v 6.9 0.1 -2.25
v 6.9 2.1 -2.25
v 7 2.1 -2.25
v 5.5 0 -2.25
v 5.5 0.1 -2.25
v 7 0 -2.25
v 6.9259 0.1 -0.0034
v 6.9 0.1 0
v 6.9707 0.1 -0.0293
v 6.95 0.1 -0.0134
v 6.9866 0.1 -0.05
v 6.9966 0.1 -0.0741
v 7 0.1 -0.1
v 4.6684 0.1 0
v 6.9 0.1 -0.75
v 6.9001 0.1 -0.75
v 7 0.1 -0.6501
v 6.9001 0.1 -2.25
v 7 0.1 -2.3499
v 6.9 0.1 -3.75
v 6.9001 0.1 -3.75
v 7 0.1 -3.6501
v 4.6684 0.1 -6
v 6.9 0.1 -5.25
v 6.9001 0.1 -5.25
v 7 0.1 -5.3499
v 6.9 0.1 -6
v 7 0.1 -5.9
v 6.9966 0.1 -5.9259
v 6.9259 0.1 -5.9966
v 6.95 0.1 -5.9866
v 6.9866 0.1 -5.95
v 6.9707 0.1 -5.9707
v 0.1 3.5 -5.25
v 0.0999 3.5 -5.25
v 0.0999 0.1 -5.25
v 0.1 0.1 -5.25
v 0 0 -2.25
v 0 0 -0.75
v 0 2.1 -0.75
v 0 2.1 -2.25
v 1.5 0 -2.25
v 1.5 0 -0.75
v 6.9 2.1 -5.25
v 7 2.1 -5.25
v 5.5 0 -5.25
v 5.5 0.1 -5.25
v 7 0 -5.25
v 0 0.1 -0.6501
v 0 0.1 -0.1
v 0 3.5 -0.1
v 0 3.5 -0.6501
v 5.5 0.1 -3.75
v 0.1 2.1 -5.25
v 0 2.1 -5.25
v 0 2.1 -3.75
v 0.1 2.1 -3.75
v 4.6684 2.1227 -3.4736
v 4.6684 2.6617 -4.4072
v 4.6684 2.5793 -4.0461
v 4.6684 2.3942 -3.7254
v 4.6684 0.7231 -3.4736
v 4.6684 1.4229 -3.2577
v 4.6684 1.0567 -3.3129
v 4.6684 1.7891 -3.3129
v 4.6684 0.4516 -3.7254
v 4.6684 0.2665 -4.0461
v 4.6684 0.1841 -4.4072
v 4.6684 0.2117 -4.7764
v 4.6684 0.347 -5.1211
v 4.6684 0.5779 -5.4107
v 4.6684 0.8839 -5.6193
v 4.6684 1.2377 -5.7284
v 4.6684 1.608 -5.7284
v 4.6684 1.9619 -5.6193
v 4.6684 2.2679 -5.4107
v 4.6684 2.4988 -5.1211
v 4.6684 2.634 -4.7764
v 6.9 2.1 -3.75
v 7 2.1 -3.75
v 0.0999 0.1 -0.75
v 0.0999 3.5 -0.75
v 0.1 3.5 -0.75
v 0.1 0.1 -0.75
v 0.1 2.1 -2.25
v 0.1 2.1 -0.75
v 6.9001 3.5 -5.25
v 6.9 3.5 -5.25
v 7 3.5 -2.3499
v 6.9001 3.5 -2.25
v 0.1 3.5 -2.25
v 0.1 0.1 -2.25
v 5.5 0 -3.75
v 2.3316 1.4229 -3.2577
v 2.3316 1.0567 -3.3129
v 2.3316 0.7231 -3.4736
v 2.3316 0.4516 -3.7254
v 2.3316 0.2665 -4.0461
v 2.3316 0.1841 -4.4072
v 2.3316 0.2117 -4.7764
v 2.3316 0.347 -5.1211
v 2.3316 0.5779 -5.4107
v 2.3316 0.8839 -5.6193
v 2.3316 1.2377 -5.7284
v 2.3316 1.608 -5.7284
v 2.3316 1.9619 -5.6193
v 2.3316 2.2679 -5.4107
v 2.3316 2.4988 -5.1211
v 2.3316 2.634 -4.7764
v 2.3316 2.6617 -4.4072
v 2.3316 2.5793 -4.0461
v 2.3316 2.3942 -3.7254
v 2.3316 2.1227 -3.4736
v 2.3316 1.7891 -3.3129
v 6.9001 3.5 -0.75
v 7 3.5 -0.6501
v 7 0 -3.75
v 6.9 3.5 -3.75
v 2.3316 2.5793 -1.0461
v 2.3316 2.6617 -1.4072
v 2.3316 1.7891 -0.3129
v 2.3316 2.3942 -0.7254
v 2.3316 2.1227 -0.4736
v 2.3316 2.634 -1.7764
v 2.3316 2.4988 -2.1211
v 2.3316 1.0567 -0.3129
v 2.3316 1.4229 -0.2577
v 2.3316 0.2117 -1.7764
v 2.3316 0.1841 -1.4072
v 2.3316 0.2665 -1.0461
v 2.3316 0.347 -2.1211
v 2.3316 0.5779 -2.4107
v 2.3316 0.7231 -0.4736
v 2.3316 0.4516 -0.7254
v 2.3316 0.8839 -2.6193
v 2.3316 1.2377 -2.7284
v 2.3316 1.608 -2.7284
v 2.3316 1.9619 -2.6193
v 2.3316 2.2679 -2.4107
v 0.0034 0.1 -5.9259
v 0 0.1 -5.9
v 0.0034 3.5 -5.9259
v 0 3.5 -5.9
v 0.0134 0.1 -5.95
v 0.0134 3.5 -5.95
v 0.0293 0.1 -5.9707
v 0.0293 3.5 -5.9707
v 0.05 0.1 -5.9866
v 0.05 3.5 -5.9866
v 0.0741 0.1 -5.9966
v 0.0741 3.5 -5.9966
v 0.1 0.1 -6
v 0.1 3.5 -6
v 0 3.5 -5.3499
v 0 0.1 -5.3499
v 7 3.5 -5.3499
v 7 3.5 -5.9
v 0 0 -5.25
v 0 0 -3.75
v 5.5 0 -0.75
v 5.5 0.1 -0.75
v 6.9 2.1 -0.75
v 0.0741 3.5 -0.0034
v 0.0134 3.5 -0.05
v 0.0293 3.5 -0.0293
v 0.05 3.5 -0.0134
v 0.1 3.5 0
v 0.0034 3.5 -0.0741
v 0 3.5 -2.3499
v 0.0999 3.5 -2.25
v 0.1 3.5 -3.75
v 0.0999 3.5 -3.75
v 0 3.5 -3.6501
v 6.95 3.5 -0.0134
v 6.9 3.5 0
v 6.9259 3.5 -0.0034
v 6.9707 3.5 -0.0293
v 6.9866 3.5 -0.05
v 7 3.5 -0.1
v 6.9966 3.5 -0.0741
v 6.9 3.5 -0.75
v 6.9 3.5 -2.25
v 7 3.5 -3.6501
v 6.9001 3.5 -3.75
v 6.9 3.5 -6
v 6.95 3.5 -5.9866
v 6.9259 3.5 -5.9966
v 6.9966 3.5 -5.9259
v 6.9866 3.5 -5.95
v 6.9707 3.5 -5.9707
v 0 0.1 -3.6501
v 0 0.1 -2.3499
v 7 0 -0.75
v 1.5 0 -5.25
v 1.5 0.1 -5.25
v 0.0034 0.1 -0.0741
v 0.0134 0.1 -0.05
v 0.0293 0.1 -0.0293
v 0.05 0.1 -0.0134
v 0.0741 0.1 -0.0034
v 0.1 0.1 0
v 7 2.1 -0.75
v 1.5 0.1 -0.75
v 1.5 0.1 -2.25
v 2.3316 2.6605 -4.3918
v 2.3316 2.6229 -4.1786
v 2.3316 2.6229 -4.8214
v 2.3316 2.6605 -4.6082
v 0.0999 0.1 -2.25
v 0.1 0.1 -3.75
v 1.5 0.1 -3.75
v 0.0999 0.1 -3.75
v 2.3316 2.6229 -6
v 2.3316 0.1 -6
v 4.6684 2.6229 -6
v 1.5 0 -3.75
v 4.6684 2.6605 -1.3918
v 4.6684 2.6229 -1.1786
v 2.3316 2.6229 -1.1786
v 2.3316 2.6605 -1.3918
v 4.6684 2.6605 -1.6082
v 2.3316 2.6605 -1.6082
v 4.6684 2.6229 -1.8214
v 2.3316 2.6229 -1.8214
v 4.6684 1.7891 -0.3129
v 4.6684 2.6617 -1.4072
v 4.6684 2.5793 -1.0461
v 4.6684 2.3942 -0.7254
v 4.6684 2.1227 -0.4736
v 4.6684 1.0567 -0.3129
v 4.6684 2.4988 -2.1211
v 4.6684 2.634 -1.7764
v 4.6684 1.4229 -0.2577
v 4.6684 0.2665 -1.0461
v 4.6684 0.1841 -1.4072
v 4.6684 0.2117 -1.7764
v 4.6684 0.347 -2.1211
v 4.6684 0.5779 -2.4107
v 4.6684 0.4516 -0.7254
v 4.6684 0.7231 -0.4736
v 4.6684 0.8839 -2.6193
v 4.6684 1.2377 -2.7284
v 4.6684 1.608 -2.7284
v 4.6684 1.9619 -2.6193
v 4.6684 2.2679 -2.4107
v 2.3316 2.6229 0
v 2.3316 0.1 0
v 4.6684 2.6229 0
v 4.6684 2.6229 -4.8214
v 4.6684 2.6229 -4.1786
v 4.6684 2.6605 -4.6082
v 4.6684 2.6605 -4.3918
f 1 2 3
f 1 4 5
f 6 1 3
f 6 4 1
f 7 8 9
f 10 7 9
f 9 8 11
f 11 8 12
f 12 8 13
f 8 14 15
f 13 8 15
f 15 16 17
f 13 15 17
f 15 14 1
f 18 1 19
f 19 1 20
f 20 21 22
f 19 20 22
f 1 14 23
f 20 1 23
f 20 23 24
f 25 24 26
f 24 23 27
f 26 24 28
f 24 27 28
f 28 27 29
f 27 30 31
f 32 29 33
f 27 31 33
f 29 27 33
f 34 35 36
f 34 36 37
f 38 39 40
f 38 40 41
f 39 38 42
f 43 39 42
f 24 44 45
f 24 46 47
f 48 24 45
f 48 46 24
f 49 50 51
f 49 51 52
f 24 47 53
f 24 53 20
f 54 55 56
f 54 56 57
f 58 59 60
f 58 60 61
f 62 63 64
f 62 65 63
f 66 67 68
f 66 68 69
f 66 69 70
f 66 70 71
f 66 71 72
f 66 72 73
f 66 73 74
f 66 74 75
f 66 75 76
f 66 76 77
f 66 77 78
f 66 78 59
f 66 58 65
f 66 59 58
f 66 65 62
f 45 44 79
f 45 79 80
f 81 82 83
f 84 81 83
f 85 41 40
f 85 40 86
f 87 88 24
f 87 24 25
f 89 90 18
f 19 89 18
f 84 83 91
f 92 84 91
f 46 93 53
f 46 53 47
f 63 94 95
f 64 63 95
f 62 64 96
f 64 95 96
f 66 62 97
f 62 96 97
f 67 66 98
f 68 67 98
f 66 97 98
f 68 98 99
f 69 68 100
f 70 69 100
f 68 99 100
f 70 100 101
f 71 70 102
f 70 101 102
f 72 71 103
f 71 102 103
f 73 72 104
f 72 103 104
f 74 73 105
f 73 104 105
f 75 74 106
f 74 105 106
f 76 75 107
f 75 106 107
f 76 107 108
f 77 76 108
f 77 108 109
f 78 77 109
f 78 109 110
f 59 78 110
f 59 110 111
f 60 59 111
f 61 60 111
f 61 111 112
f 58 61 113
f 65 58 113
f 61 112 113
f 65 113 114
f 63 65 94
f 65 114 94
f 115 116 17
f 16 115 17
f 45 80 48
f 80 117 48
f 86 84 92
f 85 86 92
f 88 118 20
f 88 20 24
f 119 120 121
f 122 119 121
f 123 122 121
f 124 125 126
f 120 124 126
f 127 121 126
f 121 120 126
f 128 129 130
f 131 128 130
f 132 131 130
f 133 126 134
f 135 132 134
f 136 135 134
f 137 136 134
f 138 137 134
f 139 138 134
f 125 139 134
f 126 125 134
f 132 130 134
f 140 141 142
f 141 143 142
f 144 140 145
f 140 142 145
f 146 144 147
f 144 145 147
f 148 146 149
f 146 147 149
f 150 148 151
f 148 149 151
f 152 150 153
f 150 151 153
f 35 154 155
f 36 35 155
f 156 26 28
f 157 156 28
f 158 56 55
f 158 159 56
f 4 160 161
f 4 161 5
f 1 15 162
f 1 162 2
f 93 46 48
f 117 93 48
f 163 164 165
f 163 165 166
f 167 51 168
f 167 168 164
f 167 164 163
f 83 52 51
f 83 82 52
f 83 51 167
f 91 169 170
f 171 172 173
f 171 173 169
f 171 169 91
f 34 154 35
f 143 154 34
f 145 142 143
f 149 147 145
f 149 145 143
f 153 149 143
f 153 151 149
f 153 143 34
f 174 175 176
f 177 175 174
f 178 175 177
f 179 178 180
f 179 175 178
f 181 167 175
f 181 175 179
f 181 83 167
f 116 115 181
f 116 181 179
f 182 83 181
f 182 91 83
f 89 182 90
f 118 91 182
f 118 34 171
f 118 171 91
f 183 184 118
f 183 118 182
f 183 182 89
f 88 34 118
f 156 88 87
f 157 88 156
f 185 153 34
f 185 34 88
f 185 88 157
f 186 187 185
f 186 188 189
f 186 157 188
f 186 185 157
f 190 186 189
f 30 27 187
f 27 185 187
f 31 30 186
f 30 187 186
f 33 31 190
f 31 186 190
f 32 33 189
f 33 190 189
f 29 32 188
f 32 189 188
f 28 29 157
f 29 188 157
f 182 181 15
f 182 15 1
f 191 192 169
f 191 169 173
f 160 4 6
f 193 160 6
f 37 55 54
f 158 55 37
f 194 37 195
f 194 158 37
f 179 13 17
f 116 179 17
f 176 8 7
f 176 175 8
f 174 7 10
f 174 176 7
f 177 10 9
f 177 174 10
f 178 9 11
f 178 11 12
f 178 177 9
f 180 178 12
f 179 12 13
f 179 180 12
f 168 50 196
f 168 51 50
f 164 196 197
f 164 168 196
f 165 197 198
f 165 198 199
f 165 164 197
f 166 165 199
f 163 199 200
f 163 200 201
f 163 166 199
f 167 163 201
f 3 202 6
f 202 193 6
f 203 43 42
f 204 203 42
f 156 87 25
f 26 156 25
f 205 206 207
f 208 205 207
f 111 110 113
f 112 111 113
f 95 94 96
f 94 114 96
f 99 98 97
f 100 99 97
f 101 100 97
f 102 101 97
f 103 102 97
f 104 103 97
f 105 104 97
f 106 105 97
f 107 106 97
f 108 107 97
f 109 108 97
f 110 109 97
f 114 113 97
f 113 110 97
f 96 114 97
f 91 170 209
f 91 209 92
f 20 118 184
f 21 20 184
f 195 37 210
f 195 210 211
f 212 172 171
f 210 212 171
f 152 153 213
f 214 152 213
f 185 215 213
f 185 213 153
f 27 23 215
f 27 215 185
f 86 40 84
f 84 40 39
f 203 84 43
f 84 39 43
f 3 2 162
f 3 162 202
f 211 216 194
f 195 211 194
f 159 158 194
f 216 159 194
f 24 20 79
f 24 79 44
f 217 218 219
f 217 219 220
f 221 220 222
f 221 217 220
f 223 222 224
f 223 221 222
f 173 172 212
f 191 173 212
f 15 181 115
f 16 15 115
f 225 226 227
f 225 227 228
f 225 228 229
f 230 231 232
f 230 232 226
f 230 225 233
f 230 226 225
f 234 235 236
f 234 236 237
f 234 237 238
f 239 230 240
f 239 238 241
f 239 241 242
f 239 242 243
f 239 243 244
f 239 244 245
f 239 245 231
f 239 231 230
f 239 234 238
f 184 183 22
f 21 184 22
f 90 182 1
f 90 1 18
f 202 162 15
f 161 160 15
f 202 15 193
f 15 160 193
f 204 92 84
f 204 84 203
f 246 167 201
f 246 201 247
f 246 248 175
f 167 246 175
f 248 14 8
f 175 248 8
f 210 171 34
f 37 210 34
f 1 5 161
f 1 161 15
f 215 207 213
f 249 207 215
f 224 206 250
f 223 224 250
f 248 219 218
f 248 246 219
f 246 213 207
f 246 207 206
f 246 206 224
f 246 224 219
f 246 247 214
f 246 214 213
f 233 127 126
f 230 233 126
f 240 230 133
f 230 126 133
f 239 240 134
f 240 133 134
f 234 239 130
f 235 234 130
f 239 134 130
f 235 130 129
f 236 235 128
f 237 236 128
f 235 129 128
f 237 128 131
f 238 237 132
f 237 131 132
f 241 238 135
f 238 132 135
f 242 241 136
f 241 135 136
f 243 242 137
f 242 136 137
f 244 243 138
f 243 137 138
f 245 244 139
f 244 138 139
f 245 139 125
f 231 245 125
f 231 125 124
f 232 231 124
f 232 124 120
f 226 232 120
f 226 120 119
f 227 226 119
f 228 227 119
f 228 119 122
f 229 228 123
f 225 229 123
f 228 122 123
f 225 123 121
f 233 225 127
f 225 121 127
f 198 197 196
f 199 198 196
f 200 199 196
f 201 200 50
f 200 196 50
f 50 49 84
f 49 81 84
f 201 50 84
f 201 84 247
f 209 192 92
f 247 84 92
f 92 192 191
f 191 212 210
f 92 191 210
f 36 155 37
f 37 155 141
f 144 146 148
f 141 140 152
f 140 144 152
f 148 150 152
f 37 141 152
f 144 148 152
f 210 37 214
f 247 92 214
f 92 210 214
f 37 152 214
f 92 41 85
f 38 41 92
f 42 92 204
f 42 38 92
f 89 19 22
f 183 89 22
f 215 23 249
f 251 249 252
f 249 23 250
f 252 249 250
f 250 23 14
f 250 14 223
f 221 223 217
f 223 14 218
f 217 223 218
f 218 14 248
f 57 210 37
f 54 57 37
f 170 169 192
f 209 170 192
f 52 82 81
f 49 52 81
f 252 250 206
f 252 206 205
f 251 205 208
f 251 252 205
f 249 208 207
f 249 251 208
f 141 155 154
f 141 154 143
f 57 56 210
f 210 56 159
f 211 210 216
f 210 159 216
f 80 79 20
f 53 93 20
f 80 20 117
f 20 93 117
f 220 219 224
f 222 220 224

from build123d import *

# Parameters (mm, degrees)
SKETCH2_W             = 1.5
SKETCH2_H             = 1.5
BOSS_EXTRUDE1_DEPTH   = 0.1
BOSS_EXTRUDE1_2_DEPTH = 0.1
BOSS_EXTRUDE1_3_DEPTH = 0.1
BOSS_EXTRUDE1_4_DEPTH = 0.1
BOSS_EXTRUDE2_START   = 0.1
SKETCH5_W             = 7
SKETCH5_H             = 6
BOSS_EXTRUDE2_DEPTH   = 3.4
SKETCH6_W             = 0.1
SKETCH6_H             = 1.5
CUT_EXTRUDE1_DEPTH    = 3.4
SKETCH7_W             = 0.1
SKETCH7_H             = 1.5
BOSS_EXTRUDE4_DEPTH   = 2
BOSS_EXTRUDE4_2_DEPTH = 2
BOSS_EXTRUDE4_3_DEPTH = 2
BOSS_EXTRUDE4_4_DEPTH = 2
CHAMFER1_SIZE         = 0.1
FILLET1_R             = 0.1
SKETCH8_W             = 2.33676434
SKETCH8_H             = 2.522890168
CUT_EXTRUDE2_DEPTH    = 10.861541462
SKETCH9_R             = 1.242296886
BOSS_EXTRUDE5_DEPTH   = 2.336762
BOSS_EXTRUDE5_2_DEPTH = 2.336762
SKETCH10_R            = 1.242296886
BOSS_EXTRUDE6_DEPTH   = 2.336764
BOSS_EXTRUDE6_2_DEPTH = 2.336764


with BuildPart() as part:
    # Sketch2 → Boss-Extrude1 (new body)
    with BuildSketch(Plane(origin=(0, 0, 0), x_dir=(1, 0, 0), z_dir=(0, 1, 0))):
        with Locations((6.25, 4.5)):
            Rectangle(SKETCH2_W, SKETCH2_H)
    extrude(amount=BOSS_EXTRUDE1_DEPTH)


with BuildPart() as body_2:
    # Sketch2 → Boss-Extrude1 2 (new body)
    with BuildSketch(Plane(origin=(0, 0, 0), x_dir=(1, 0, 0), z_dir=(0, 1, 0))):
        with Locations((0.75, 4.5)):
            Rectangle(SKETCH2_W, SKETCH2_H)
    extrude(amount=BOSS_EXTRUDE1_2_DEPTH)


with BuildPart() as body_3:
    # Sketch2 → Boss-Extrude1 3 (new body)
    with BuildSketch(Plane(origin=(0, 0, 0), x_dir=(1, 0, 0), z_dir=(0, 1, 0))):
        with Locations((6.25, 1.5)):
            Rectangle(SKETCH2_W, SKETCH2_H)
    extrude(amount=BOSS_EXTRUDE1_3_DEPTH)


with BuildPart() as body_4:
    # Sketch2 → Boss-Extrude1 4 (new body)
    with BuildSketch(Plane(origin=(0, 0, 0), x_dir=(1, 0, 0), z_dir=(0, 1, 0))):
        with Locations((0.75, 1.5)):
            Rectangle(SKETCH2_W, SKETCH2_H)
    extrude(amount=BOSS_EXTRUDE1_4_DEPTH)


with BuildPart() as body_5:
    # Sketch5 → Boss-Extrude2 (new body)
    with BuildSketch(Plane(origin=(0, 0, 0), x_dir=(1, 0, 0), z_dir=(0, 1, 0)).offset(BOSS_EXTRUDE2_START)):
        with Locations((3.5, 3)):
            Rectangle(SKETCH5_W, SKETCH5_H)
    extrude(amount=BOSS_EXTRUDE2_DEPTH)

    # Sketch6 → Cut-Extrude1 (cut)
    with BuildSketch(Plane(origin=(0, 3.5, 0), x_dir=(1, 0, 0), z_dir=(0, 1, 0))):
        with Locations((6.95, 1.5)):
            Rectangle(SKETCH6_W, SKETCH6_H)
        with Locations((6.95, 4.5)):
            Rectangle(SKETCH6_W, SKETCH6_H)
        with Locations((0.05, 4.5)):
            Rectangle(SKETCH6_W, SKETCH6_H)
        with Locations((0.05, 1.5)):
            Rectangle(SKETCH6_W, SKETCH6_H)
    extrude(amount=-CUT_EXTRUDE1_DEPTH, mode=Mode.SUBTRACT)

    # Chamfer1
    chamfer1_edges = [body_5.edges().sort_by_distance(p)[0] for p in [
        (0, 1.8, -0.75),
        (0, 1.8, -2.25),
        (0, 1.8, -3.75),
        (0, 1.8, -5.25),
        (7, 1.8, -5.25),
        (7, 1.8, -0.75),
        (7, 1.8, -3.75),
        (7, 1.8, -2.25),
    ]]
    chamfer(chamfer1_edges, length=CHAMFER1_SIZE - 0.0001)  # a hair under: the kernel refuses the full size

    # Fillet1
    fillet1_edges = [body_5.edges().sort_by_distance(p)[0] for p in [
        (0, 1.8, 0),
        (7, 1.8, 0),
        (7, 1.8, -6),
        (0, 1.8, -6),
    ]]
    fillet(fillet1_edges, radius=FILLET1_R)

    # Sketch8 → Cut-Extrude2 (cut, through all)
    with BuildSketch(Plane.XY):
        with Locations((3.5, 1.361445084)):
            Rectangle(SKETCH8_W, SKETCH8_H)
    extrude(amount=-CUT_EXTRUDE2_DEPTH, mode=Mode.SUBTRACT)


with BuildPart() as body_6:
    # Sketch7 → Boss-Extrude4 (new body)
    with BuildSketch(Plane(origin=(0, 0.1, 0), x_dir=(1, 0, 0), z_dir=(0, 1, 0))):
        with Locations((6.95, 1.5)):
            Rectangle(SKETCH7_W, SKETCH7_H)
    extrude(amount=BOSS_EXTRUDE4_DEPTH)


with BuildPart() as body_7:
    # Sketch7 → Boss-Extrude4 2 (new body)
    with BuildSketch(Plane(origin=(0, 0.1, 0), x_dir=(1, 0, 0), z_dir=(0, 1, 0))):
        with Locations((6.95, 4.5)):
            Rectangle(SKETCH7_W, SKETCH7_H)
    extrude(amount=BOSS_EXTRUDE4_2_DEPTH)


with BuildPart() as body_8:
    # Sketch7 → Boss-Extrude4 3 (new body)
    with BuildSketch(Plane(origin=(0, 0.1, 0), x_dir=(1, 0, 0), z_dir=(0, 1, 0))):
        with Locations((0.05, 1.5)):
            Rectangle(SKETCH7_W, SKETCH7_H)
    extrude(amount=BOSS_EXTRUDE4_3_DEPTH)

    # Combine1: union body 4
    add(body_4.part)


with BuildPart() as body_9:
    # Sketch7 → Boss-Extrude4 4 (new body)
    with BuildSketch(Plane(origin=(0, 0.1, 0), x_dir=(1, 0, 0), z_dir=(0, 1, 0))):
        with Locations((0.05, 4.5)):
            Rectangle(SKETCH7_W, SKETCH7_H)
    extrude(amount=BOSS_EXTRUDE4_4_DEPTH)


with BuildPart() as body_2_1:
    add(body_2.part)

    # Combine2: union body 9
    add(body_9.part)


with BuildPart() as part_1:
    add(part.part)

    # Combine3: union body 7
    add(body_7.part)


with BuildPart() as body_3_1:
    add(body_3.part)

    # Combine4: union body 6
    add(body_6.part)


with BuildPart() as body_6_2:
    # Sketch9 → Boss-Extrude5 (new body)
    with BuildSketch(Plane.ZY.offset(-4.66838217)):
        with Locations(Location((-1.5, 1.422890168, 0), (0, 0, 180))):
            Circle(SKETCH9_R)
    extrude(amount=BOSS_EXTRUDE5_DEPTH)


with BuildPart() as body_7_2:
    # Sketch9 → Boss-Extrude5 2 (new body)
    with BuildSketch(Plane.ZY.offset(-4.66838217)):
        with Locations(Location((-4.5, 1.422890168, 0), (0, 0, 180))):
            Circle(SKETCH9_R)
    extrude(amount=BOSS_EXTRUDE5_2_DEPTH)


with BuildPart() as body_5_1:
    add(body_5.part)

    # Combine6: cut body 6 2, body 7 2
    add(body_6_2.part, mode=Mode.SUBTRACT)
    add(body_7_2.part, mode=Mode.SUBTRACT)


with BuildPart() as body_6_3:
    # Sketch10 → Boss-Extrude6 (new body)
    with BuildSketch(Plane(origin=(2.33161783, 0, 0), x_dir=(0, 0, -1), z_dir=(1, 0, 0))):
        with Locations(Location((1.5, 1.422890168, 0), (0, 0, 180))):
            Circle(SKETCH10_R)
    extrude(amount=BOSS_EXTRUDE6_DEPTH)


with BuildPart() as body_7_3:
    # Sketch10 → Boss-Extrude6 2 (new body)
    with BuildSketch(Plane(origin=(2.33161783, 0, 0), x_dir=(0, 0, -1), z_dir=(1, 0, 0))):
        with Locations(Location((4.5, 1.422890168, 0), (0, 0, 180))):
            Circle(SKETCH10_R)
    extrude(amount=BOSS_EXTRUDE6_2_DEPTH)


solid = Compound([body_8.part, body_2_1.part, part_1.part, body_3_1.part, body_5_1.part, body_6_3.part, body_7_3.part])
